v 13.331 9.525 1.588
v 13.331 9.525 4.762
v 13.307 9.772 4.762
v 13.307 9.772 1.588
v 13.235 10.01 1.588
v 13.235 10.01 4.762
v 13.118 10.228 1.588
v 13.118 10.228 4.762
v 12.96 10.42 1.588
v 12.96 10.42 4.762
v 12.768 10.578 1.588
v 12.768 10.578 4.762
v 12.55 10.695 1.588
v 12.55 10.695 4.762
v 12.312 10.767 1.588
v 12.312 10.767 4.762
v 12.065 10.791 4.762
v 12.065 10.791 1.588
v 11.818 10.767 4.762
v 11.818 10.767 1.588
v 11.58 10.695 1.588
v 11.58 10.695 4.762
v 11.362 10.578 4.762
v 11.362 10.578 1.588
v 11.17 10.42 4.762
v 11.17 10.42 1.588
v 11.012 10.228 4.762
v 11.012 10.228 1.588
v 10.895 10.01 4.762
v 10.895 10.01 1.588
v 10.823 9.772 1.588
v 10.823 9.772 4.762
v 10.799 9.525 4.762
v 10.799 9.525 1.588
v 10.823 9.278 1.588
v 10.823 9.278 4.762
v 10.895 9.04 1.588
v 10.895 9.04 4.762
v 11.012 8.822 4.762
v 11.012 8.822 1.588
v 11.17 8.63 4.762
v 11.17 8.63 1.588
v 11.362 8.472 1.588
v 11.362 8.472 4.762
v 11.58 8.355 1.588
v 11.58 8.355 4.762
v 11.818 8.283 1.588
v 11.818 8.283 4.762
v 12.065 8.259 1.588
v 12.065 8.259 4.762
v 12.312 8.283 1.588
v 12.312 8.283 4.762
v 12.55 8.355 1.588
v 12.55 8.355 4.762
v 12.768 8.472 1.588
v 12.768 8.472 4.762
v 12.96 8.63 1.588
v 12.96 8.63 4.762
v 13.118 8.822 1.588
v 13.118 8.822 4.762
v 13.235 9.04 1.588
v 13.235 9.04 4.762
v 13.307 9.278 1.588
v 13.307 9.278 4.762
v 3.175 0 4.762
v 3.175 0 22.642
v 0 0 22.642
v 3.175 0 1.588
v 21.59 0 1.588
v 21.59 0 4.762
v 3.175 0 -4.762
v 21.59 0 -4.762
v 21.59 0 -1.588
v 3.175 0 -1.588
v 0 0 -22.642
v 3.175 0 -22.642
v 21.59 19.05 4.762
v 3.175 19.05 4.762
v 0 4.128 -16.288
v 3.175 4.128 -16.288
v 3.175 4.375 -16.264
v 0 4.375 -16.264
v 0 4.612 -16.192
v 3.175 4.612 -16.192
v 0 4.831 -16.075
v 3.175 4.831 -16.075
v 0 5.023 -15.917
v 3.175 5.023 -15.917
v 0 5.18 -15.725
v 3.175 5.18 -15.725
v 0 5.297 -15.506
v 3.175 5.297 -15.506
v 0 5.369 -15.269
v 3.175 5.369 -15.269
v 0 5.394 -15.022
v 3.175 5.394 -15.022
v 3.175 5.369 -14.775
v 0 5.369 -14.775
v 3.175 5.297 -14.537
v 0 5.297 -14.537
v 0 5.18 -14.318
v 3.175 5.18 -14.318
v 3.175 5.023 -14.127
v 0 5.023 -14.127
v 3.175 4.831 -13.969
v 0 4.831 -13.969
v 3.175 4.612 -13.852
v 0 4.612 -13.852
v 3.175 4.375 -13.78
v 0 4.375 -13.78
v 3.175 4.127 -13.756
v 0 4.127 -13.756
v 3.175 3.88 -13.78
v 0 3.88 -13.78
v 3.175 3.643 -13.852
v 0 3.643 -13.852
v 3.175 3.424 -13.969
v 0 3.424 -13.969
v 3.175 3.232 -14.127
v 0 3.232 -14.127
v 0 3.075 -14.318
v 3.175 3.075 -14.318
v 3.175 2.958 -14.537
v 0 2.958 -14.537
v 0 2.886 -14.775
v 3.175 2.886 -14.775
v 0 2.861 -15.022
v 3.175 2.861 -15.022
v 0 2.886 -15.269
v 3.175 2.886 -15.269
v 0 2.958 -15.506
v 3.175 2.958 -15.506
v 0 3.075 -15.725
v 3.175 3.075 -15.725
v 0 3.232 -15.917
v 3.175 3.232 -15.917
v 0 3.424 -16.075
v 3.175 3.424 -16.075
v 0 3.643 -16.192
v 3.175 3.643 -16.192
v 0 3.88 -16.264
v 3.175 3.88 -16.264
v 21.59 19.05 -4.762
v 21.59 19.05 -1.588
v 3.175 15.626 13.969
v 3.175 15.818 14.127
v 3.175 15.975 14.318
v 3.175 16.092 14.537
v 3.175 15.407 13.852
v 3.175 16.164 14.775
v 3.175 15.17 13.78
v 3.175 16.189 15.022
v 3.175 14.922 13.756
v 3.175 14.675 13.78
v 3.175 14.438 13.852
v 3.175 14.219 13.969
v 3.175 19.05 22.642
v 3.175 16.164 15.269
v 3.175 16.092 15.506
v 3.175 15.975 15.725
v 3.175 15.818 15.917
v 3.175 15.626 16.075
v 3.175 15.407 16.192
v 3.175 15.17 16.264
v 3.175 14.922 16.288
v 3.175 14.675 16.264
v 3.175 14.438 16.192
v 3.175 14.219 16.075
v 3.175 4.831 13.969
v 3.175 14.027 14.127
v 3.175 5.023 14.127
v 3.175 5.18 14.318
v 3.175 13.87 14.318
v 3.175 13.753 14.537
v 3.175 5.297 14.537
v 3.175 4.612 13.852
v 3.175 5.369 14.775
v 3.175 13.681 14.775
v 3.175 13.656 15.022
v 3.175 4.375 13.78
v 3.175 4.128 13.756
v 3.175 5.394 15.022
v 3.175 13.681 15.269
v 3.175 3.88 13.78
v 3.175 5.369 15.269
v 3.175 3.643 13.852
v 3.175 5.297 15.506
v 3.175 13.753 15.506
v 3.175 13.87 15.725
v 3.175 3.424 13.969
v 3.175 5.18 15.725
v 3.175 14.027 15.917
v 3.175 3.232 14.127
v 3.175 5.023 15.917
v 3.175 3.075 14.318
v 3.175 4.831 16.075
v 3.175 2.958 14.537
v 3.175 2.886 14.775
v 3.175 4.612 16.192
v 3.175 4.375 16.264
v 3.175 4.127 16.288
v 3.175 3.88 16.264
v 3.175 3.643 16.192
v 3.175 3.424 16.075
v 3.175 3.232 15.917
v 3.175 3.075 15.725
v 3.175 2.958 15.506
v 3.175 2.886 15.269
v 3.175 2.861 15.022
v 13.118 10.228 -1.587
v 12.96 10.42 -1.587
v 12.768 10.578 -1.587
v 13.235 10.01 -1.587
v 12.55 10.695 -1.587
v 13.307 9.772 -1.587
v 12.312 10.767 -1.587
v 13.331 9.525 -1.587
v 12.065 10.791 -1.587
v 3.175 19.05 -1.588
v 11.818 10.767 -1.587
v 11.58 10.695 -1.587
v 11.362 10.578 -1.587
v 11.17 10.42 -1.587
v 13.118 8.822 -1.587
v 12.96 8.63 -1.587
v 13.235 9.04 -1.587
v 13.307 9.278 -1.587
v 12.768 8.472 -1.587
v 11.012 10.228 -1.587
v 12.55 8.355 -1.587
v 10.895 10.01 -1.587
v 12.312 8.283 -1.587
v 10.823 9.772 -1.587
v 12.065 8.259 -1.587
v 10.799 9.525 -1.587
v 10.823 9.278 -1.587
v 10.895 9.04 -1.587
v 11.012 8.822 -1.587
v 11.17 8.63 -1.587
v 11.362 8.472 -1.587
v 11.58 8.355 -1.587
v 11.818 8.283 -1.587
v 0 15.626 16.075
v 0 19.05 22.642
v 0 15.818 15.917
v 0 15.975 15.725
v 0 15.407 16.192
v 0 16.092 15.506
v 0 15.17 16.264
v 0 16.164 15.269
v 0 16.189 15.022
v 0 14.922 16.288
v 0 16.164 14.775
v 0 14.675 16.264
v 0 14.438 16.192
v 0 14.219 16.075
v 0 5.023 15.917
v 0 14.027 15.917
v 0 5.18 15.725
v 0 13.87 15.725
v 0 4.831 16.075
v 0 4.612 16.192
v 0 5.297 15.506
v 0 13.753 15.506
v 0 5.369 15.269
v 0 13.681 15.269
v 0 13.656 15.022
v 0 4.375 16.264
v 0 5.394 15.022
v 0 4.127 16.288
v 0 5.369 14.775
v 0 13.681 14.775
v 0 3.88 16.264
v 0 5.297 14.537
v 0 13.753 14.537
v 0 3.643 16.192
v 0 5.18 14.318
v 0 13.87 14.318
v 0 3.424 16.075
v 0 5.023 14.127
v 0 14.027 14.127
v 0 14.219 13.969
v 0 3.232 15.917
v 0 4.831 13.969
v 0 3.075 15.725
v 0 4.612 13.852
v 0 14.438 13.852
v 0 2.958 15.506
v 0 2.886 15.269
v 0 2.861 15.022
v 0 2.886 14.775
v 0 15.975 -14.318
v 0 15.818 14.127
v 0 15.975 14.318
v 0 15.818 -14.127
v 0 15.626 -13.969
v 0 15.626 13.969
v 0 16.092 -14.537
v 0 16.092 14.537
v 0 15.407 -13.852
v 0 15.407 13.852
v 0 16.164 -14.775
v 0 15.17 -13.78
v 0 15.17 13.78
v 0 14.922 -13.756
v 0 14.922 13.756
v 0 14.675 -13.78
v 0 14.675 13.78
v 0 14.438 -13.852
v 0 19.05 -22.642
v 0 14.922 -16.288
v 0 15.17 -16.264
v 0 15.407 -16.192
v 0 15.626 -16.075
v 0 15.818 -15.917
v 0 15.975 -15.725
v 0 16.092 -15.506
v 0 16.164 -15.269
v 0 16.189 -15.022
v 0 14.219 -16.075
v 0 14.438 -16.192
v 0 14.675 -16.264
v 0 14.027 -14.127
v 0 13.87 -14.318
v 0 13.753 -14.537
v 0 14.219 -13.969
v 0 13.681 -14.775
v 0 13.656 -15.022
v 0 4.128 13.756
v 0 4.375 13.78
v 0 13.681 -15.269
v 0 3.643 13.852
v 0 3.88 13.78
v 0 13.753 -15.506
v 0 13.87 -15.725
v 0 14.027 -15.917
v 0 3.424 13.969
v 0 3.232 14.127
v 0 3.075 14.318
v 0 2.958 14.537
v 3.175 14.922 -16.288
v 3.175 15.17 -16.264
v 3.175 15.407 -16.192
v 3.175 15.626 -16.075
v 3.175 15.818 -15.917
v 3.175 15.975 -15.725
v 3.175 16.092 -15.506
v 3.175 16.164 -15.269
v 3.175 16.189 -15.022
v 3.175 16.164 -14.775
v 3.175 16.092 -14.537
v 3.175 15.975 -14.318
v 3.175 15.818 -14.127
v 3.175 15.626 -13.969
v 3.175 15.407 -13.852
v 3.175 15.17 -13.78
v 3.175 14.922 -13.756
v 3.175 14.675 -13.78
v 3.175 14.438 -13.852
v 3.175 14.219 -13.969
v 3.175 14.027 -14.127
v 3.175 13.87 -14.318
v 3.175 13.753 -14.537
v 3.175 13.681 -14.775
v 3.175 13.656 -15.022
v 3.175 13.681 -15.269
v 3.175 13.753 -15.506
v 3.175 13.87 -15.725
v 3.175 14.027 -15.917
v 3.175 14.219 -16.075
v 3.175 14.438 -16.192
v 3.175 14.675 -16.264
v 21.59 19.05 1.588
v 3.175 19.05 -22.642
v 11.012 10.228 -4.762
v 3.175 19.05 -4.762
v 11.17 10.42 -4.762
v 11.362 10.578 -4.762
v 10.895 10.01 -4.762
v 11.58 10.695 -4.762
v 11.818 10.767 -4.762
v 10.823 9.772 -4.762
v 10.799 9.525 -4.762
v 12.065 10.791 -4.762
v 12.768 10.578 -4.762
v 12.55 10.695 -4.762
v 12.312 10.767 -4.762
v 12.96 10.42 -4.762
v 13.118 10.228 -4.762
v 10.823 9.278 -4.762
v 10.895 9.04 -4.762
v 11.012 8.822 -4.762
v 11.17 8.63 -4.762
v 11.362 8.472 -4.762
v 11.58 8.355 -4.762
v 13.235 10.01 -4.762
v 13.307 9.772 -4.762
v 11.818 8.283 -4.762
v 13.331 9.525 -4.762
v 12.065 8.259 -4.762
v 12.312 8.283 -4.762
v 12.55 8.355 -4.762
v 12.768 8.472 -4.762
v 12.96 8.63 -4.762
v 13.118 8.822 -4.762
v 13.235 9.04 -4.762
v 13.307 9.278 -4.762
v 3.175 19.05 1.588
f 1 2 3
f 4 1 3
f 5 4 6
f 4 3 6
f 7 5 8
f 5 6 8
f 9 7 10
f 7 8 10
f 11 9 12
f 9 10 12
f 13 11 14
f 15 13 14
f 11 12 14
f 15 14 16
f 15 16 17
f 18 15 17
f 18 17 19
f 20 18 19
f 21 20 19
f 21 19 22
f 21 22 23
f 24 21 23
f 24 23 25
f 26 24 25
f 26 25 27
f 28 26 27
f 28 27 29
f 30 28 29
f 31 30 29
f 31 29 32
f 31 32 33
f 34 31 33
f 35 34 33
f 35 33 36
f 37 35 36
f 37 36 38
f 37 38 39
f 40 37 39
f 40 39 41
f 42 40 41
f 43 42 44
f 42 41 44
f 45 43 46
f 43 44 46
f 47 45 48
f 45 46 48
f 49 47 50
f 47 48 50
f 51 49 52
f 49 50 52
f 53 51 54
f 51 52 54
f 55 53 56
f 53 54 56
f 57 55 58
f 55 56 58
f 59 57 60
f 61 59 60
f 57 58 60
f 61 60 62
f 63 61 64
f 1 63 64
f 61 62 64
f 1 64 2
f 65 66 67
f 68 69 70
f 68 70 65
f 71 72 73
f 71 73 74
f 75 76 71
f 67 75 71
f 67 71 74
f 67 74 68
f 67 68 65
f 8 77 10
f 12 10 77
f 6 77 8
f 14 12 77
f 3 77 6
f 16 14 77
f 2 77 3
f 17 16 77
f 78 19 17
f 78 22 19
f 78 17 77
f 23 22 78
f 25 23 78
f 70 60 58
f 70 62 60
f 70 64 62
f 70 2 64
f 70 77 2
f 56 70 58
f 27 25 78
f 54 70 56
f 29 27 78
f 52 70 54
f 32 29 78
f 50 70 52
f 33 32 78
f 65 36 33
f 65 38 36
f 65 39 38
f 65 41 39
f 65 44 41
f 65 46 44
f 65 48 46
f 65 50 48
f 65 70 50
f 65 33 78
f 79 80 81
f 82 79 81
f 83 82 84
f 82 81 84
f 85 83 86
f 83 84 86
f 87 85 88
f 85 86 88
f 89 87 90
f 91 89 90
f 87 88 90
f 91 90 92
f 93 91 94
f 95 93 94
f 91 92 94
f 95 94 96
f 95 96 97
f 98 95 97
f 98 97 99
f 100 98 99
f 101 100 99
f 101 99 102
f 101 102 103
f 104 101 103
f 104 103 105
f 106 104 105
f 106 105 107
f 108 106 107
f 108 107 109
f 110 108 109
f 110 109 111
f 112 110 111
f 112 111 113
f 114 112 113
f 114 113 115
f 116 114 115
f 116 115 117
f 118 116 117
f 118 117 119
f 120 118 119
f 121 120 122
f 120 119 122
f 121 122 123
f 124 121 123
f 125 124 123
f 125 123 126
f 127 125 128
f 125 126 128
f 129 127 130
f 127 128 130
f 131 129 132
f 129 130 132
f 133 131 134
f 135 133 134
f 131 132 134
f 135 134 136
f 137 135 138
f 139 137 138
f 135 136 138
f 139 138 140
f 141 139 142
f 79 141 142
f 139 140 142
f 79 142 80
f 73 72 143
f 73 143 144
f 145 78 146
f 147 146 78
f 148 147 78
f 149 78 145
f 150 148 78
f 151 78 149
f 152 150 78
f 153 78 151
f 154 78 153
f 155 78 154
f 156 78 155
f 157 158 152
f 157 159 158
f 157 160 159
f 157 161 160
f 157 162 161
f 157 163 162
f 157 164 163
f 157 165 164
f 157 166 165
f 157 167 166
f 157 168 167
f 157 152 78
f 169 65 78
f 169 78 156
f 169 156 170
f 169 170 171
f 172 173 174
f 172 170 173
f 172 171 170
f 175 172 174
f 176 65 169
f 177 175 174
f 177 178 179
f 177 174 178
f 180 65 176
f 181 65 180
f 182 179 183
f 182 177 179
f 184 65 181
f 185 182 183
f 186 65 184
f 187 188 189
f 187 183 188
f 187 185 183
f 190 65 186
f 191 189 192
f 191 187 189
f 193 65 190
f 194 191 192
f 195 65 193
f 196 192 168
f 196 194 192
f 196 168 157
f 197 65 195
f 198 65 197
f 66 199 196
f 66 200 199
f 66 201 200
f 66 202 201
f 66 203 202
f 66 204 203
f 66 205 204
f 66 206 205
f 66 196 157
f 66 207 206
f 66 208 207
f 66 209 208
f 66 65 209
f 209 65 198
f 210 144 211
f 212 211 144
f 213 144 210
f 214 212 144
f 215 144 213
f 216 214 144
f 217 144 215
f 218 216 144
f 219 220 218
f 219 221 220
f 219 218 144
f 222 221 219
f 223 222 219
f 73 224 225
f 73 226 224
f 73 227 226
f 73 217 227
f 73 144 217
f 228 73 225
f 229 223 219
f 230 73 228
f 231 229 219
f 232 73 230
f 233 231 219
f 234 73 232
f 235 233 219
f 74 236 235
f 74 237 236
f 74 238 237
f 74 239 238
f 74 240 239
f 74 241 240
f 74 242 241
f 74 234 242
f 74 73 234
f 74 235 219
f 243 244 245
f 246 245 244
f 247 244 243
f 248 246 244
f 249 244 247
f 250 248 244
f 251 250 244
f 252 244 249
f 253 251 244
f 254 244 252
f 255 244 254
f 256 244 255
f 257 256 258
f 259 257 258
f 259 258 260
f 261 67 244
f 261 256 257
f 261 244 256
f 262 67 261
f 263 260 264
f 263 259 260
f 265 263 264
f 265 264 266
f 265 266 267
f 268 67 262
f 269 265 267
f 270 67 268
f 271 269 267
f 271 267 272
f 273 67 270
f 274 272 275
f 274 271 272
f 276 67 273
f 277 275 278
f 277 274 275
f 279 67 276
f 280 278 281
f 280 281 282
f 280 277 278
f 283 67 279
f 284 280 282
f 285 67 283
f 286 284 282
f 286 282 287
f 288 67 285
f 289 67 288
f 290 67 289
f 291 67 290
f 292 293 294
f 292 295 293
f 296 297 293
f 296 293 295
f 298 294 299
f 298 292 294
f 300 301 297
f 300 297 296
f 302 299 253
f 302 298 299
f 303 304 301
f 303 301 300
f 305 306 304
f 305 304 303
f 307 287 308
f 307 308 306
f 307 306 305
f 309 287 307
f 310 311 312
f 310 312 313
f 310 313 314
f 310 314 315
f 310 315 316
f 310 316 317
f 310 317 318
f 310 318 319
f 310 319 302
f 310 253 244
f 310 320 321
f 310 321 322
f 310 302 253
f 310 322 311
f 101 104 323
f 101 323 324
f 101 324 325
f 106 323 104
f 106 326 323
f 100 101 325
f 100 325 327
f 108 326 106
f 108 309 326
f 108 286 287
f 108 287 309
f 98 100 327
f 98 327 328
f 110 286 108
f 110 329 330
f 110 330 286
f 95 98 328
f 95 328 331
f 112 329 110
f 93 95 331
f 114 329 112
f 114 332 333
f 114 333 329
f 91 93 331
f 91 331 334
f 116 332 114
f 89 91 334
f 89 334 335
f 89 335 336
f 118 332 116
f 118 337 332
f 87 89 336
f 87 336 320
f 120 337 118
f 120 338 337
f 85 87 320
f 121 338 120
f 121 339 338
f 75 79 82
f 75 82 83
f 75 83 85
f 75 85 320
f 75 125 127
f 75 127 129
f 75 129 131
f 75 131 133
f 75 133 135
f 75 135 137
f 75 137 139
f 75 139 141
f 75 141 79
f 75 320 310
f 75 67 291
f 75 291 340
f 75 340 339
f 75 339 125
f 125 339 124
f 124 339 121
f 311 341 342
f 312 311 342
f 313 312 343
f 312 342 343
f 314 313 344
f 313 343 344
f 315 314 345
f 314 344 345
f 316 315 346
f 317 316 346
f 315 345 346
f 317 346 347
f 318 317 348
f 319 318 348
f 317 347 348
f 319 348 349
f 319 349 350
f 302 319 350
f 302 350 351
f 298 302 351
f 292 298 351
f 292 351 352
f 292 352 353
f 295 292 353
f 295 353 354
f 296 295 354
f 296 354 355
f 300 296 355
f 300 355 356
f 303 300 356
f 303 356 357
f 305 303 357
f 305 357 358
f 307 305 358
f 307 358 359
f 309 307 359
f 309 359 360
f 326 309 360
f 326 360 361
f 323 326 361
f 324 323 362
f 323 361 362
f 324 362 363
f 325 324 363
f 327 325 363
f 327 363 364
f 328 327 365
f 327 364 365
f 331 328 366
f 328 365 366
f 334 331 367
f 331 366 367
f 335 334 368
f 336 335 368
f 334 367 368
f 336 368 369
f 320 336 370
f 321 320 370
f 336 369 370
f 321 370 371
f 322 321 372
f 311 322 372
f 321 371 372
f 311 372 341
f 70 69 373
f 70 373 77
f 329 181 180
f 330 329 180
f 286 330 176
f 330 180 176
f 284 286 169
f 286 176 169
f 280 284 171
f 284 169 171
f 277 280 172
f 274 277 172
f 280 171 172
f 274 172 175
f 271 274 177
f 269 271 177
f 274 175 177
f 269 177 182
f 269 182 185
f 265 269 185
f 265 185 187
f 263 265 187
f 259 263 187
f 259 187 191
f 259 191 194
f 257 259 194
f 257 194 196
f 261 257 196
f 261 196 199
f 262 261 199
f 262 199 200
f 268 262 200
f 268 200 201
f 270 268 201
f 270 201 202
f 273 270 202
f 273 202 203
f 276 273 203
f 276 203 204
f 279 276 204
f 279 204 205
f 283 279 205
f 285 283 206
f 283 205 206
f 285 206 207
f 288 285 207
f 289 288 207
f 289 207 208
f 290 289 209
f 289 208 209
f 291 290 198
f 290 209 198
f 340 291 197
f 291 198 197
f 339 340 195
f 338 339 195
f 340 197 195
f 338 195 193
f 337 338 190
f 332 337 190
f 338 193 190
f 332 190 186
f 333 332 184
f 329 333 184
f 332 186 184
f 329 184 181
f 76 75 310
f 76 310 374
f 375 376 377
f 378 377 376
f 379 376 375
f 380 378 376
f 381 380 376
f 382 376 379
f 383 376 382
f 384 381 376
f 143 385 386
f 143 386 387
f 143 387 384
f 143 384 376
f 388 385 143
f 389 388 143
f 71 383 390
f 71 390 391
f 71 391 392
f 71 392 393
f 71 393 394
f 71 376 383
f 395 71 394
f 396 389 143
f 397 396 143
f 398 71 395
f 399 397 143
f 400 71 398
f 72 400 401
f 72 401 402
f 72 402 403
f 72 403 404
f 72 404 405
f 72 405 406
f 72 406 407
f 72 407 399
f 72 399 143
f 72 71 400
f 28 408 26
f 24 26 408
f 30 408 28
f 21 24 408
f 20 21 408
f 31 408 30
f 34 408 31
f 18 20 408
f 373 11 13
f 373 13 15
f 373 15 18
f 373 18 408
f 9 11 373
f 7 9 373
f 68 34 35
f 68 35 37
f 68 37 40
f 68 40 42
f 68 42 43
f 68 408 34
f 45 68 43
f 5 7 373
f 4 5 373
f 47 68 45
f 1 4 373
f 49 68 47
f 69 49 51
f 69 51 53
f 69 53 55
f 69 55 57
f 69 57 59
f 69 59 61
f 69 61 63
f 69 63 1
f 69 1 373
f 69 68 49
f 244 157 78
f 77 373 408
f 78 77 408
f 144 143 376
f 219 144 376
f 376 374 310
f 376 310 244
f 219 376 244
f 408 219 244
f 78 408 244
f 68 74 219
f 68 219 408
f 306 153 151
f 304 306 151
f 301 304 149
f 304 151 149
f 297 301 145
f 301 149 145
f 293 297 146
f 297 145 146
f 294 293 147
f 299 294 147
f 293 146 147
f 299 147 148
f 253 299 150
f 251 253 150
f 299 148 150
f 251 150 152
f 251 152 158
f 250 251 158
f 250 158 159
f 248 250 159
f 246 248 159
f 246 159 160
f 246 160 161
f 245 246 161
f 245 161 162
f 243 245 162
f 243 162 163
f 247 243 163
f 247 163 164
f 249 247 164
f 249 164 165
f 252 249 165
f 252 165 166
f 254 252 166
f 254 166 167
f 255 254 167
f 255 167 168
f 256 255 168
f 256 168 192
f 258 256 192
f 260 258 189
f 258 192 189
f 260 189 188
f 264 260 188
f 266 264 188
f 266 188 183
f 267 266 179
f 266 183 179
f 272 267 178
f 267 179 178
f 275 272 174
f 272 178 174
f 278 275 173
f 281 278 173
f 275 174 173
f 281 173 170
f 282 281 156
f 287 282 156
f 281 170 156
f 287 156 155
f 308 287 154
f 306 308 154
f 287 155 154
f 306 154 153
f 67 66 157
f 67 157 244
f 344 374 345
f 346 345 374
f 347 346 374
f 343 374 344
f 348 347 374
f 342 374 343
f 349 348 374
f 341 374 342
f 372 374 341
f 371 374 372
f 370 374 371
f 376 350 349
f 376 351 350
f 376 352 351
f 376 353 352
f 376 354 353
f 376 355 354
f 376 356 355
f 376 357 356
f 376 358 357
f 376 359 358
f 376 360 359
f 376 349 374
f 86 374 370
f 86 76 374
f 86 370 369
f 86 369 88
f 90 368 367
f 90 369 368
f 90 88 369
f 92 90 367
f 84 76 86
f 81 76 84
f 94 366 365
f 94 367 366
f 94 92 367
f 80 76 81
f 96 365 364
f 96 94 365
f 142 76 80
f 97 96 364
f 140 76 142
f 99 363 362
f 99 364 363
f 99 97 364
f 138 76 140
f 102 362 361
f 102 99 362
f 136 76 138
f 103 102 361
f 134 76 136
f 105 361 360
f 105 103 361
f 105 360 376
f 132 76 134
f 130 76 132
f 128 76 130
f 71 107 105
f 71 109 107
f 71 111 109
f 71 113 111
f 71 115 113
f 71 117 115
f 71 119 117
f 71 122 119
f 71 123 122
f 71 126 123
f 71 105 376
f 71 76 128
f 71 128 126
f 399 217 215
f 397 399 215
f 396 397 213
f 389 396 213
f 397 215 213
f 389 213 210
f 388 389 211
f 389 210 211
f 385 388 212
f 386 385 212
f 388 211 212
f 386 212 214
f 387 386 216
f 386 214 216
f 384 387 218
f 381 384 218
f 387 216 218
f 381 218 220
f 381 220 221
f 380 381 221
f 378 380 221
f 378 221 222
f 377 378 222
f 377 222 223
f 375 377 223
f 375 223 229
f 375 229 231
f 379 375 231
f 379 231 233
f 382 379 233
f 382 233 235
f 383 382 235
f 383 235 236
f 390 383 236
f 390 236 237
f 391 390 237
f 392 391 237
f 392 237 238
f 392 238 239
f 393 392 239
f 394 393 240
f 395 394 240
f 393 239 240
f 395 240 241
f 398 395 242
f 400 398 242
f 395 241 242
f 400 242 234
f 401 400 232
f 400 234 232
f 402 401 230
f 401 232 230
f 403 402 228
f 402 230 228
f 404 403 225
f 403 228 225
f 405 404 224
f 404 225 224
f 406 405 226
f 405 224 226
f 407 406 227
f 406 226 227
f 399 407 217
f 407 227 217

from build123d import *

# Parameters (mm, degrees)
BOSS_EXTRUDE1_DEPTH     = 19.05
SKETCH2_R               = 1.26619
CUT_EXTRUDE1_DEPTH      = 18.879441165
CUT_EXTRUDE1_DEPTH_BACK = 28.404441165
SKETCH3_R               = 1.26619
CUT_EXTRUDE2_DEPTH      = 4.175


with BuildPart() as part:
    # Sketch1 → Boss-Extrude1 (new body)
    with BuildSketch(Plane(origin=(0, 0, 0), x_dir=(1, 0, 0), z_dir=(0, 1, 0))):
        Polygon((0, -22.641941165), (0, 22.641941165), (3.175, 22.641941165), (3.175, 4.7625), (21.59, 4.7625), (21.59, 1.5875), (3.175, 1.5875), (3.175, -1.5875), (21.59, -1.5875), (21.59, -4.7625), (3.175, -4.7625), (3.175, -22.641941165), align=None)
    extrude(amount=BOSS_EXTRUDE1_DEPTH)

    # Sketch2 → Cut-Extrude1 (cut, two sides)
    with BuildSketch(Plane.XY.offset(4.7625)) as cut_extrude1_sk:
        with Locations((12.065, 9.525)):
            Circle(SKETCH2_R)
    extrude(amount=CUT_EXTRUDE1_DEPTH, mode=Mode.SUBTRACT)
    extrude(cut_extrude1_sk.sketch, amount=-CUT_EXTRUDE1_DEPTH_BACK, mode=Mode.SUBTRACT)

    # Sketch3 → Cut-Extrude2 (cut, through all)
    with BuildSketch(Plane(origin=(3.175, 0, 0), x_dir=(0, 0, -1), z_dir=(1, 0, 0))):
        with Locations((-15.021941165, 14.9225)):
            Circle(SKETCH3_R)
        with Locations((-15.021941165, 4.1275)):
            Circle(SKETCH3_R)
        with Locations((15.021941165, 4.1275)):
            Circle(SKETCH3_R)
        with Locations((15.021941165, 14.9225)):
            Circle(SKETCH3_R)
    extrude(amount=-CUT_EXTRUDE2_DEPTH, mode=Mode.SUBTRACT)


solid = part.part
